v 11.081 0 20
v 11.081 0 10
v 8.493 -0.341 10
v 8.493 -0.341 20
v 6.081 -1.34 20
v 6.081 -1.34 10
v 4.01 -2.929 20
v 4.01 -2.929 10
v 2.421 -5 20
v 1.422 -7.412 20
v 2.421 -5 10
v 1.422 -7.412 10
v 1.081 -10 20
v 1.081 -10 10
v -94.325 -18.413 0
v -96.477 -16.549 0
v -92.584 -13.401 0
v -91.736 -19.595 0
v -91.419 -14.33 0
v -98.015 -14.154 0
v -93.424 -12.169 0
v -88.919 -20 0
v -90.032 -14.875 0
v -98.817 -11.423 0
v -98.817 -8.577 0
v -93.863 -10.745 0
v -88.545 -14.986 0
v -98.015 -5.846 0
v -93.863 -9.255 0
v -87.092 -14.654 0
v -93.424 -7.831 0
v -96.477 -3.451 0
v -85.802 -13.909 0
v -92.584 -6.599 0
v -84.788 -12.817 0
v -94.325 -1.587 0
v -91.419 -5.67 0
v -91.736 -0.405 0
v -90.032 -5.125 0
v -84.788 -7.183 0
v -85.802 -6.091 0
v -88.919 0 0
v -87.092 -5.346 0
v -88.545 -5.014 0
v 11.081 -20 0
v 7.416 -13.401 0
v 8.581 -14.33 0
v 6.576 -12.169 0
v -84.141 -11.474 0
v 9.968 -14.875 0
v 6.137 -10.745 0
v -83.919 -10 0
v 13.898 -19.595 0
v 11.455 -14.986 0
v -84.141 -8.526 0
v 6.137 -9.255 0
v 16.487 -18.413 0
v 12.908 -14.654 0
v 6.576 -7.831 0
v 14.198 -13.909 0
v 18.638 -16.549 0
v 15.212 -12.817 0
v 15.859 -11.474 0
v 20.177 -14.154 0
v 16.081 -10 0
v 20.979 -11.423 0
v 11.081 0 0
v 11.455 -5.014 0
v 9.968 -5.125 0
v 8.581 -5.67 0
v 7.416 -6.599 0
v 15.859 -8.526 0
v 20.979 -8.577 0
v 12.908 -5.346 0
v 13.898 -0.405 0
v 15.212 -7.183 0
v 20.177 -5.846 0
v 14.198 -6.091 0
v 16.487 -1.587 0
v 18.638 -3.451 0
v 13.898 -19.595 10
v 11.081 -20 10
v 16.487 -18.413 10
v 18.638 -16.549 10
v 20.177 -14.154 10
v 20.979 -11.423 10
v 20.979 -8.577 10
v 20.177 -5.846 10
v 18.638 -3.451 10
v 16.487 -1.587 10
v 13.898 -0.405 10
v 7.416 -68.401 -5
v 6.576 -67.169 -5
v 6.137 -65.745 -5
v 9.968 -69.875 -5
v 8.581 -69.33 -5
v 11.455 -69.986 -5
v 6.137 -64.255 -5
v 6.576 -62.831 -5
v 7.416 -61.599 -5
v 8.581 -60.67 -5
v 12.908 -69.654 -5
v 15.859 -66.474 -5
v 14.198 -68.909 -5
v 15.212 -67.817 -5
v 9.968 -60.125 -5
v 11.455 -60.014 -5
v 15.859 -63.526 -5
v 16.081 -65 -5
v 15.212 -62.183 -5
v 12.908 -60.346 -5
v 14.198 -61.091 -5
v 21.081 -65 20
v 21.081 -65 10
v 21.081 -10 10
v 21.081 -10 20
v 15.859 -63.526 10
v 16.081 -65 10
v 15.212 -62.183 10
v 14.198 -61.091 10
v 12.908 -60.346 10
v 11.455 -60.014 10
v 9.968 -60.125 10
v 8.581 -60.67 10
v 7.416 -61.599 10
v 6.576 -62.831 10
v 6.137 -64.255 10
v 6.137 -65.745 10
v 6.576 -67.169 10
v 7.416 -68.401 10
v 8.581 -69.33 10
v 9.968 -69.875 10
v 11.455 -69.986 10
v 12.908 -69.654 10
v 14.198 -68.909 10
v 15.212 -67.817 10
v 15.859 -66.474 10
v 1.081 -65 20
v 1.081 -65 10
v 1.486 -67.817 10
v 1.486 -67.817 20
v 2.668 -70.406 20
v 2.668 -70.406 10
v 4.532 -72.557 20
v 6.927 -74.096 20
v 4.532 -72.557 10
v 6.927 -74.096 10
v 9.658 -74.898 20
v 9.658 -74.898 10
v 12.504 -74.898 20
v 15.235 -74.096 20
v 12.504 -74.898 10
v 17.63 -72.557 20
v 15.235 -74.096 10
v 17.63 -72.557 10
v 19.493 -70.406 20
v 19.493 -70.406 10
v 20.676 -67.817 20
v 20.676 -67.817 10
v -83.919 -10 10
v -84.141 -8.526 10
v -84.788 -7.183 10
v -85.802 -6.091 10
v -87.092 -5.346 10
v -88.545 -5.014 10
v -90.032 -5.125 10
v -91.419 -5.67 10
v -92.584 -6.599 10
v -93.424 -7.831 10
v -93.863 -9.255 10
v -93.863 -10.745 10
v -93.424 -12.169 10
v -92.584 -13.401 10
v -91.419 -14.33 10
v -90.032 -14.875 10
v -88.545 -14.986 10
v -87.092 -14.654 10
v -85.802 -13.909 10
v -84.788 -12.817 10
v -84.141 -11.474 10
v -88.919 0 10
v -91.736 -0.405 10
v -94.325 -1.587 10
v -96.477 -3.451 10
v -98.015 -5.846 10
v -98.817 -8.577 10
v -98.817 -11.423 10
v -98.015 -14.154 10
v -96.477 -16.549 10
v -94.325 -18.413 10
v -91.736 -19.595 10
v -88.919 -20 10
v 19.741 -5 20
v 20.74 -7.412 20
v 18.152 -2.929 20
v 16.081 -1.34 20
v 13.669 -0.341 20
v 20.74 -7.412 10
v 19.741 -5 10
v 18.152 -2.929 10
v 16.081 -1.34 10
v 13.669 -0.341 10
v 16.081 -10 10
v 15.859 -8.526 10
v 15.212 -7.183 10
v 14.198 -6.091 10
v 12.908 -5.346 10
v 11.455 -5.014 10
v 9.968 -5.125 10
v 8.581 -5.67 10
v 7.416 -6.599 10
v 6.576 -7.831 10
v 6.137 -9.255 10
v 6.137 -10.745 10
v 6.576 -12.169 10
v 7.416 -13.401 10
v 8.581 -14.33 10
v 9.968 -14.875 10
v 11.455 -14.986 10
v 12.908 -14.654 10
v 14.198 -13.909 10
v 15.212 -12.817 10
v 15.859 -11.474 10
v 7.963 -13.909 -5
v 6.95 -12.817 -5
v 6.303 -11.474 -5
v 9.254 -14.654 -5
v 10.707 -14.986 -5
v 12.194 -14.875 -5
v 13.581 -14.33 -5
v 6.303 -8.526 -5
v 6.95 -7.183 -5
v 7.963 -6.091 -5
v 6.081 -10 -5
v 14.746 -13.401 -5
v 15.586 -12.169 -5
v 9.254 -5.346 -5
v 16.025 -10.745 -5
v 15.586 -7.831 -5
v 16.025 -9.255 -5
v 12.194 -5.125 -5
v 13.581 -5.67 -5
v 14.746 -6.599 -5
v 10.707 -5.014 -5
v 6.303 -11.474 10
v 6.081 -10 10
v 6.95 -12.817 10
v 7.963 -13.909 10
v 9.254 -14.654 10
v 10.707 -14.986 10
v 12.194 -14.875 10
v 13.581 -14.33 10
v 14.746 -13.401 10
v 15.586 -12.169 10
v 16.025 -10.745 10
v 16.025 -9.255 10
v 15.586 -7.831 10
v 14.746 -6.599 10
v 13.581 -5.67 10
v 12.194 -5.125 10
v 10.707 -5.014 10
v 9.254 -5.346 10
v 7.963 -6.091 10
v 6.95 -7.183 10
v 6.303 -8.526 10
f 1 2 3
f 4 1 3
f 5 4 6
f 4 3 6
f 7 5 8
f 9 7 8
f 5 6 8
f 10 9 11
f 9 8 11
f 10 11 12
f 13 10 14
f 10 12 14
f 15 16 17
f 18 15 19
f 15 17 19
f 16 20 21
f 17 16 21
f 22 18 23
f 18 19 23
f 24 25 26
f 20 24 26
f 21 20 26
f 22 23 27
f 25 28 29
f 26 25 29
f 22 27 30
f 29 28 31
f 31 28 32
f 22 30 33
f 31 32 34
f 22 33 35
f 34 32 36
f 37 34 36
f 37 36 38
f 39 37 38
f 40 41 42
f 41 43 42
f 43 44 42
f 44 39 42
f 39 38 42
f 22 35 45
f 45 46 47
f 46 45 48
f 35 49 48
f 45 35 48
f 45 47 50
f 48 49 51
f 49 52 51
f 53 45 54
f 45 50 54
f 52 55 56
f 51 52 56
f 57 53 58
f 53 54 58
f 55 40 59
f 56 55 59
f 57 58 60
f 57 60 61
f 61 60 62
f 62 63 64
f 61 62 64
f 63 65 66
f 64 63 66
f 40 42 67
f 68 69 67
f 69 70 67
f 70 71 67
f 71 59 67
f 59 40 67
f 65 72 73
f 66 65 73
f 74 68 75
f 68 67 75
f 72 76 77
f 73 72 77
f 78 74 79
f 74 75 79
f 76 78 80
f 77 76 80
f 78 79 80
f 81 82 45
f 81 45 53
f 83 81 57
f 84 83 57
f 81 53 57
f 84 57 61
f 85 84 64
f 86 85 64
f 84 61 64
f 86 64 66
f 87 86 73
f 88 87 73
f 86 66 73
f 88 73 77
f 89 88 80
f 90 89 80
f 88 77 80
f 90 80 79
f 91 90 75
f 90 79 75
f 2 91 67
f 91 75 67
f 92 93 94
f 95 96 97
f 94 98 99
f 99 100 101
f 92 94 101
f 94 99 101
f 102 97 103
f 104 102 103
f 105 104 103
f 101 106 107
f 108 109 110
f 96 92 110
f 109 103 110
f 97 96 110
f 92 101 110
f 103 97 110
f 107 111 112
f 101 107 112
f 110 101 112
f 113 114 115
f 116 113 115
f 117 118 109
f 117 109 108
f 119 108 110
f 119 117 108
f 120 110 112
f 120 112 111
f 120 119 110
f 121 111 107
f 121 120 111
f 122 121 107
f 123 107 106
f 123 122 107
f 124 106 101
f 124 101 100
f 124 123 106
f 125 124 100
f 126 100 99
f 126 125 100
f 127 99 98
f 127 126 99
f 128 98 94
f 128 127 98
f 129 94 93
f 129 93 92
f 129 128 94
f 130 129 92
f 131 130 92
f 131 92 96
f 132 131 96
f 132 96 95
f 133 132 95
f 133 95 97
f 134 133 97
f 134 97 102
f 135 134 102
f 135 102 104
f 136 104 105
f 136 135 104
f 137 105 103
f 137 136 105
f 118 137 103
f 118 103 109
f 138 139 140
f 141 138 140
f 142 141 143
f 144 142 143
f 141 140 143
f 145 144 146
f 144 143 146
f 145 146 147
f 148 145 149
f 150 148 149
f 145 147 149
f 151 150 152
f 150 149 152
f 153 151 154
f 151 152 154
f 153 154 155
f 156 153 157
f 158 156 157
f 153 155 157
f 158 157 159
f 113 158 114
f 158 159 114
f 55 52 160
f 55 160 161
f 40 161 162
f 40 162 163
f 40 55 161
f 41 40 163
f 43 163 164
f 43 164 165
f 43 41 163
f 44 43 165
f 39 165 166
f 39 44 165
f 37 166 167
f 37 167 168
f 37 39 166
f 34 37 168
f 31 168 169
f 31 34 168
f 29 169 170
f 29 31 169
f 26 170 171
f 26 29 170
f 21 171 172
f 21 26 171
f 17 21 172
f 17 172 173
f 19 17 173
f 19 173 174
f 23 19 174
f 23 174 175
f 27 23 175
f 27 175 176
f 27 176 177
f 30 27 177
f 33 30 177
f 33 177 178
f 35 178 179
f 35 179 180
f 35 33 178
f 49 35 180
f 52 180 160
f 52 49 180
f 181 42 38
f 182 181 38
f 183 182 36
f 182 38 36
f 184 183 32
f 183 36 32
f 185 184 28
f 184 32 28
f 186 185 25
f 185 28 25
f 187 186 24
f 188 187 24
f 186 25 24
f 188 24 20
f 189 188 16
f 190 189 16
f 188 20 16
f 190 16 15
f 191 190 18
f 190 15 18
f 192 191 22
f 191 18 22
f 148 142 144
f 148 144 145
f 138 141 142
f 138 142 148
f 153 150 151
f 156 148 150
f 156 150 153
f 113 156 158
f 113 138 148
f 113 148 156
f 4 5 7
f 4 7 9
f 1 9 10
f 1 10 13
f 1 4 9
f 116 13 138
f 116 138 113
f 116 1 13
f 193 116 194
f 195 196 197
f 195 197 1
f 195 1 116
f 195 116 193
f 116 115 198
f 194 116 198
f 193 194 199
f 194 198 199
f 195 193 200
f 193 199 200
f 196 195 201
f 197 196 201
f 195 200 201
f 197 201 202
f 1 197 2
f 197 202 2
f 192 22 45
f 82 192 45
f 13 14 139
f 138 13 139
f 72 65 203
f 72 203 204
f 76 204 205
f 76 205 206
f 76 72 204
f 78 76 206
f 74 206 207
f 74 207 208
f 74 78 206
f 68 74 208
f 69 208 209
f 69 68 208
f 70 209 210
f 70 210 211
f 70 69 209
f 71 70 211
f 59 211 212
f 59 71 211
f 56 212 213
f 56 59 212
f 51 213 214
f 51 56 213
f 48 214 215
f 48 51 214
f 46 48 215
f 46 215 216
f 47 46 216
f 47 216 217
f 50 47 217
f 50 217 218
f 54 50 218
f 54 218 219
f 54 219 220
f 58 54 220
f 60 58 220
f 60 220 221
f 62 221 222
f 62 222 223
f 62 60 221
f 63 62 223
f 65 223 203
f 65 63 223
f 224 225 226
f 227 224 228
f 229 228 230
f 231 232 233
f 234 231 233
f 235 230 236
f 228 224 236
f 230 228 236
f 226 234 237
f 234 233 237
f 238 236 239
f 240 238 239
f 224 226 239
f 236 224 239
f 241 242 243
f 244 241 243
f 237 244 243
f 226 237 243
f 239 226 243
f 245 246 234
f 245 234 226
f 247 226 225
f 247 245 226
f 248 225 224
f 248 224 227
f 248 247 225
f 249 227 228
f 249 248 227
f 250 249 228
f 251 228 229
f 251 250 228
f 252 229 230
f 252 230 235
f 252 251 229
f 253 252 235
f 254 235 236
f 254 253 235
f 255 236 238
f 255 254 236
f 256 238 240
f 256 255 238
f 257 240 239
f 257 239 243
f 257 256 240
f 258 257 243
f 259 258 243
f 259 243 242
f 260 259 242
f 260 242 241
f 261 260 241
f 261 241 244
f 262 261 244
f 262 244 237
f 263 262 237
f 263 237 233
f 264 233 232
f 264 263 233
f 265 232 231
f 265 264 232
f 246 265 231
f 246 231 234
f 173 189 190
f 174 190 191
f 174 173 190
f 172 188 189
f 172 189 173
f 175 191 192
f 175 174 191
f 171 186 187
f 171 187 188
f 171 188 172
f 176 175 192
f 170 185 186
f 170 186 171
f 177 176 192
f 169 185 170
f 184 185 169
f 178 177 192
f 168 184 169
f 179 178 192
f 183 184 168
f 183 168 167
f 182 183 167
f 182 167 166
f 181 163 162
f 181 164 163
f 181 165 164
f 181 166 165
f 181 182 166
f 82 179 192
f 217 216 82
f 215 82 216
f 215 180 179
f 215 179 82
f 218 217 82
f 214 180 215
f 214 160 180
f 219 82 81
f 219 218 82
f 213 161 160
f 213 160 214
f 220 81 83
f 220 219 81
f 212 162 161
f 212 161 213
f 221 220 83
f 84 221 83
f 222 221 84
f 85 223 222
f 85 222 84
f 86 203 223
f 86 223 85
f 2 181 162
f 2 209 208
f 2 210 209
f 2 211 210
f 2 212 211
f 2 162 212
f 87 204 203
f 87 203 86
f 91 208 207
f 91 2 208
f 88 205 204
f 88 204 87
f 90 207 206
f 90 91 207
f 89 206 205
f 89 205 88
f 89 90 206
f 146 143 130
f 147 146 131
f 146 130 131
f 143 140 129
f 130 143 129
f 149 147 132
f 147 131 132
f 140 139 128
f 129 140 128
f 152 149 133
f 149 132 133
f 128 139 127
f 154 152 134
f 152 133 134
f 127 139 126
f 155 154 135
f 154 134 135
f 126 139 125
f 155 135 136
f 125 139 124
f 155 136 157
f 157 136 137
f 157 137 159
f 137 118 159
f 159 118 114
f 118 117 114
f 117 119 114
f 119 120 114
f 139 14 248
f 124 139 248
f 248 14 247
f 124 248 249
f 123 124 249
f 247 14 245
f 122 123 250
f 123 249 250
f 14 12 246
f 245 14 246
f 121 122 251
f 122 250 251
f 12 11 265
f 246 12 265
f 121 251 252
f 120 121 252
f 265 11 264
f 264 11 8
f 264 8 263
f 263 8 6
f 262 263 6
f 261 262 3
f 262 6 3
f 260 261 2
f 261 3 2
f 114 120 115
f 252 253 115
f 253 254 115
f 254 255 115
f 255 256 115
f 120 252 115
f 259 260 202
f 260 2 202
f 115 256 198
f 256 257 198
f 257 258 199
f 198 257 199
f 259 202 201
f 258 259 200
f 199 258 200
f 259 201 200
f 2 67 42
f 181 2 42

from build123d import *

# Parameters (mm, degrees)
F0_R     = 5
F1_DEPTH = 10
F3_DEPTH = 10
F4_DEPTH = 15
F5_DEPTH = 15


with BuildPart() as f1:
    # F0 (on Top) → F1 (new body)
    with BuildSketch(Plane.XY):
        with BuildLine():
            Line((11.080931966, 0), (-88.919068034, 0))
            ThreePointArc((-88.919068034, 0), (-98.919068034, -10), (-88.919068034, -20))
            Line((-88.919068034, -20), (11.080931966, -20))
            ThreePointArc((11.080931966, -20), (21.080931966, -10), (11.080931966, 0))
        make_face()
        with Locations((-88.919068034, -10)):
            Circle(F0_R, mode=Mode.SUBTRACT)
        with Locations((11.080931966, -10)):
            Circle(F0_R, mode=Mode.SUBTRACT)
    extrude(amount=F1_DEPTH)


with BuildPart() as f3:
    # F2 (on face) → F3 (new body)
    with BuildSketch(Plane.XY.offset(10)):
        with BuildLine():
            Line((21.080931966, -65), (21.080931966, -10))
            ThreePointArc((21.080931966, -10), (18.1519997779, -17.0710678119), (11.080931966, -20))
            Line((11.080931966, -20), (1.080931966, -20))
            Line((1.080931966, -20), (1.080931966, -65))
            ThreePointArc((1.080931966, -65), (11.080931966, -55), (21.080931966, -65))
        make_face()
        with BuildLine():
            ThreePointArc((11.080931966, -20), (18.1519997779, -17.0710678119), (21.080931966, -10))
            Line((21.080931966, -10), (16.080931966, -10))
            ThreePointArc((16.080931966, -10), (11.080931966, -15), (6.080931966, -10))
            Line((6.080931966, -10), (1.080931966, -10))
            ThreePointArc((1.080931966, -10), (4.0098641541, -17.0710678119), (11.080931966, -20))
        make_face()
        with BuildLine():
            Line((1.080931966, -20), (11.080931966, -20))
            ThreePointArc((11.080931966, -20), (4.0098641541, -17.0710678119), (1.080931966, -10))
            Line((1.080931966, -10), (1.080931966, -20))
        make_face()
        with BuildLine():
            Line((16.080931966, -10), (21.080931966, -10))
            ThreePointArc((21.080931966, -10), (18.1519997779, -2.9289321881), (11.080931966, 0))
            ThreePointArc((11.080931966, 0), (4.0098641541, -2.9289321881), (1.080931966, -10))
            Line((1.080931966, -10), (6.080931966, -10))
            ThreePointArc((6.080931966, -10), (11.080931966, -5), (16.080931966, -10))
        make_face()
        with BuildLine():
            ThreePointArc((1.080931966, -65), (11.080931966, -75), (21.080931966, -65))
            ThreePointArc((21.080931966, -65), (11.080931966, -55), (1.080931966, -65))
        make_face()
        with BuildLine():
            ThreePointArc((16.080931966, -65), (11.080931966, -70), (6.080931966, -65))
            ThreePointArc((6.080931966, -65), (11.080931966, -60), (16.080931966, -65))
        make_face(mode=Mode.SUBTRACT)
        with BuildLine():
            ThreePointArc((6.080931966, -10), (11.080931966, -15), (16.080931966, -10))
            Line((16.080931966, -10), (6.080931966, -10))
        make_face()
        with BuildLine():
            Line((6.080931966, -10), (16.080931966, -10))
            ThreePointArc((16.080931966, -10), (11.080931966, -5), (6.080931966, -10))
        make_face()
        with BuildLine():
            ThreePointArc((16.080931966, -65), (11.080931966, -60), (6.080931966, -65))
            Line((6.080931966, -65), (16.080931966, -65))
        make_face()
        with BuildLine():
            Line((16.080931966, -65), (6.080931966, -65))
            ThreePointArc((6.080931966, -65), (11.080931966, -70), (16.080931966, -65))
        make_face()
    extrude(amount=F3_DEPTH)

    # F2 (on face) → F4 (join)
    with BuildSketch(Plane.XY.offset(10)):
        with BuildLine():
            Line((6.080931966, -10), (16.080931966, -10))
            ThreePointArc((16.080931966, -10), (11.080931966, -5), (6.080931966, -10))
        make_face()
        with BuildLine():
            ThreePointArc((6.080931966, -10), (11.080931966, -15), (16.080931966, -10))
            Line((16.080931966, -10), (6.080931966, -10))
        make_face()
    extrude(amount=-F4_DEPTH)

    # F2 (on face) → F5 (join)
    with BuildSketch(Plane.XY.offset(10)):
        with BuildLine():
            Line((16.080931966, -65), (6.080931966, -65))
            ThreePointArc((6.080931966, -65), (11.080931966, -70), (16.080931966, -65))
        make_face()
        with BuildLine():
            ThreePointArc((16.080931966, -65), (11.080931966, -60), (6.080931966, -65))
            Line((6.080931966, -65), (16.080931966, -65))
        make_face()
    extrude(amount=-F5_DEPTH)


solid = Compound([f1.part, f3.part])
